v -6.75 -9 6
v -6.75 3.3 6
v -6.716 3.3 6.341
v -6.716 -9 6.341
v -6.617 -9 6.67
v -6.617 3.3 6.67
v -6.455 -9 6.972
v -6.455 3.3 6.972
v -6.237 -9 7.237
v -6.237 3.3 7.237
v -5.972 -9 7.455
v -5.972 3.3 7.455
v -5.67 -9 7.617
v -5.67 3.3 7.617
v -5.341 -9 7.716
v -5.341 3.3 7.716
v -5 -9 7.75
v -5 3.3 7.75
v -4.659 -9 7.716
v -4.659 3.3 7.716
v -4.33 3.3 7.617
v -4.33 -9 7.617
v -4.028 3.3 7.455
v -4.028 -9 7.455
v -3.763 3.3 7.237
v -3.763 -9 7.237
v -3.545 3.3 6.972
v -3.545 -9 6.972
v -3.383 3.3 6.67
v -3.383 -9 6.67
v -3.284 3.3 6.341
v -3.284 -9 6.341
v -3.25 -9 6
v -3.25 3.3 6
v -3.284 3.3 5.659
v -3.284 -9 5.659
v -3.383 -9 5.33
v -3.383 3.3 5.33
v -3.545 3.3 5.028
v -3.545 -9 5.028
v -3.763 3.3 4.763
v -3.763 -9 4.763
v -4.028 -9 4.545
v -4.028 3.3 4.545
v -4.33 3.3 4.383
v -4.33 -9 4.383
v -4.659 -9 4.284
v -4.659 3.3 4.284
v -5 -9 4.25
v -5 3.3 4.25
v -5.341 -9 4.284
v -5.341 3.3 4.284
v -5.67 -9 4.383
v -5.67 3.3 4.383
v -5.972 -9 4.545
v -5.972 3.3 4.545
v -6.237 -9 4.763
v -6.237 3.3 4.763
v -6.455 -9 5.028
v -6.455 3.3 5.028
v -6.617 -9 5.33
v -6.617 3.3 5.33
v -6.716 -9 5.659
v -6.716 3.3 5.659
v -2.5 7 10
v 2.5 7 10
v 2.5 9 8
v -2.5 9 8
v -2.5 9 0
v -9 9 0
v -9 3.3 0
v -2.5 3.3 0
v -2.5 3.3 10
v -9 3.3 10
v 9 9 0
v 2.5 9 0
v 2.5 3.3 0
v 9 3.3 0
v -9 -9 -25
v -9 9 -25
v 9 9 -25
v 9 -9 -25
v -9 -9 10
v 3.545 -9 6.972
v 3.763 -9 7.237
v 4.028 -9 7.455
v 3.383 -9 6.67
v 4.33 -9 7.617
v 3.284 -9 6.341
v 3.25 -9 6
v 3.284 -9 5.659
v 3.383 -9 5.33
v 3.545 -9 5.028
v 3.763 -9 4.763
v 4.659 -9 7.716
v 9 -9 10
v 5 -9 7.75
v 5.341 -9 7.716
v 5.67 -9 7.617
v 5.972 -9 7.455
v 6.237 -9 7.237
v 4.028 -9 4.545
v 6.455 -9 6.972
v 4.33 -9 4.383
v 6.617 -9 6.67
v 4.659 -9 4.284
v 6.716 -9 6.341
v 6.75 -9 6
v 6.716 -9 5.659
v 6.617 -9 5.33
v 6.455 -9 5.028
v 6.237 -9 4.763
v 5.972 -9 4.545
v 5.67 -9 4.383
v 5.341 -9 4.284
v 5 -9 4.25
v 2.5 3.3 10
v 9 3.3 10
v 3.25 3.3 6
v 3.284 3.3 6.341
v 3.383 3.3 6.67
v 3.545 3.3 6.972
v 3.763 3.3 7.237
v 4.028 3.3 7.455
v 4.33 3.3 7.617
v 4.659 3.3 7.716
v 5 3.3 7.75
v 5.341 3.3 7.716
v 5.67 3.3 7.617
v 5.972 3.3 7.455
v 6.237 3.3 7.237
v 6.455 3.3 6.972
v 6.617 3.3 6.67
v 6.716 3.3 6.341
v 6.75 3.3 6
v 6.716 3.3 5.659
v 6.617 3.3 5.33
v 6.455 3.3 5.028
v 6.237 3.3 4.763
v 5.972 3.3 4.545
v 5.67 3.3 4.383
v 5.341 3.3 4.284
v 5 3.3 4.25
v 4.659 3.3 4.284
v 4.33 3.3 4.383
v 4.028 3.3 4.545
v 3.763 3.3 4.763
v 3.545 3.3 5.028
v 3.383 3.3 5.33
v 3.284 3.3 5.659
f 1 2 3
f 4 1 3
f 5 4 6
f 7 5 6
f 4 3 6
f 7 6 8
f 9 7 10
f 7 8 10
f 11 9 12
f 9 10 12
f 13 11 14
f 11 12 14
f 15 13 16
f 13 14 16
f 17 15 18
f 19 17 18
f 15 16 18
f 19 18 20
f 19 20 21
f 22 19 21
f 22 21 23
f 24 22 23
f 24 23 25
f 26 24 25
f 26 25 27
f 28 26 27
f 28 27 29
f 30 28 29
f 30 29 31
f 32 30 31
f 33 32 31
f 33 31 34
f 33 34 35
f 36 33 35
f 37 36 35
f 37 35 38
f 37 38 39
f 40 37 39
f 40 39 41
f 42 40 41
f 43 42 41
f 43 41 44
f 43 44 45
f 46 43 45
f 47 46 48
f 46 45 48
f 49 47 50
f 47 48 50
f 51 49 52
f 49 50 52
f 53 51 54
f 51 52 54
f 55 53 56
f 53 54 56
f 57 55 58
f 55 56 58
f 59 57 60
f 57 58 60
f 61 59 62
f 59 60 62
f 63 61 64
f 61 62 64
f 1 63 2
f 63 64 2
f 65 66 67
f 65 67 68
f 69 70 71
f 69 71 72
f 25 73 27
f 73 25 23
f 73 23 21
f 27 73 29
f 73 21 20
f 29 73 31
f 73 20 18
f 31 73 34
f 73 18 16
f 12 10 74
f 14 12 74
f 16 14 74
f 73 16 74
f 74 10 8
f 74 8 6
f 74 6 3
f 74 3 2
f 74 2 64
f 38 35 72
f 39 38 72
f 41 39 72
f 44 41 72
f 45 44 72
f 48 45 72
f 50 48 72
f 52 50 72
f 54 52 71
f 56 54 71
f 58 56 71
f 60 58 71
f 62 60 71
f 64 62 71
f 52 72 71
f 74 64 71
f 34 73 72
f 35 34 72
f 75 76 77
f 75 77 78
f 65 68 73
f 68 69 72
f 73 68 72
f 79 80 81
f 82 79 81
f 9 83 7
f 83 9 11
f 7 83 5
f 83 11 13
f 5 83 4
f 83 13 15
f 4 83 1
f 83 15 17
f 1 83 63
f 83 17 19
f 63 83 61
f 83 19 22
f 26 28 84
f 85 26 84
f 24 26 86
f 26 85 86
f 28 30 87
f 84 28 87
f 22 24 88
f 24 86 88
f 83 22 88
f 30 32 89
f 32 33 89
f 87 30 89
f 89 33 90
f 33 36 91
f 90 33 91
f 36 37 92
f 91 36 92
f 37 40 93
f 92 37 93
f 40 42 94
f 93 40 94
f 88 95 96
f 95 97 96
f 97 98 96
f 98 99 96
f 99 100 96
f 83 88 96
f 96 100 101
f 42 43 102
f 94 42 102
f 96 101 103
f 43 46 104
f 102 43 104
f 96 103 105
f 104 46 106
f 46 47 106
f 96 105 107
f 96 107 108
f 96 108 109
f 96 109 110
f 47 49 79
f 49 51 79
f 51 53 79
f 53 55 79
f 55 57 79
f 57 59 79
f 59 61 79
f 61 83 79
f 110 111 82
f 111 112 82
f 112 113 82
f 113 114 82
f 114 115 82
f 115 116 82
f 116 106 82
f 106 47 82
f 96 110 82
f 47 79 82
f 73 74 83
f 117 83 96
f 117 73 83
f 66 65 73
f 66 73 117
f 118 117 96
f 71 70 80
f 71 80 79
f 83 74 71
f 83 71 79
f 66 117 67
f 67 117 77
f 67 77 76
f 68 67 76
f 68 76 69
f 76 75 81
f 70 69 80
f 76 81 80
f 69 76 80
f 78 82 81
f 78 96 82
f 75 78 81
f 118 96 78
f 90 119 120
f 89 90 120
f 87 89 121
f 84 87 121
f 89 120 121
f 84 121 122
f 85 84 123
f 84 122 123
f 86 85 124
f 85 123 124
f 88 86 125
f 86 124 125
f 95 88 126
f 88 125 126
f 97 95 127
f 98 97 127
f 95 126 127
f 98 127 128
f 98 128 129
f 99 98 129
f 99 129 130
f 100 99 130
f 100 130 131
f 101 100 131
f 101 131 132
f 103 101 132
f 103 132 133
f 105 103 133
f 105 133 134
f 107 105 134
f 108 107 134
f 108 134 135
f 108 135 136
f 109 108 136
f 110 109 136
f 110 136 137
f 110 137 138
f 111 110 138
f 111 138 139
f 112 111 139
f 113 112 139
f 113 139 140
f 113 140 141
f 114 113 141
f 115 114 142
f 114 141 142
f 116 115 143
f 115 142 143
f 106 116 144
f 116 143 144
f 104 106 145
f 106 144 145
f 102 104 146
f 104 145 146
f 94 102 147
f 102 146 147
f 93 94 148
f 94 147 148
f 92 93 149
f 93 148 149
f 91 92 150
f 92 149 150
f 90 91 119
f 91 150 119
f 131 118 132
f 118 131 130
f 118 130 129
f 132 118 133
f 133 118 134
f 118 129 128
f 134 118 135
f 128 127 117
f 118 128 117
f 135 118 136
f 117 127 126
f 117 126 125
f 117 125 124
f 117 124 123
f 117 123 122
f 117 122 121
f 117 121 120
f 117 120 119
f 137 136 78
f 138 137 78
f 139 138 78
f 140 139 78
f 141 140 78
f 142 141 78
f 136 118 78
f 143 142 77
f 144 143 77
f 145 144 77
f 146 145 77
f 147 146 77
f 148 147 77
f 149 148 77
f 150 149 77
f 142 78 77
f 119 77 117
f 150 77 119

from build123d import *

# Parameters (mm, degrees)
F0_W     = 6.5
F0_H     = 5.7
F1_DEPTH = 25
F2_DEPTH = 10
F3_SIZE  = 2
F5_D     = 3.5


with BuildPart() as f1:
    # F0 (on Top) → F1 (new body)
    with BuildSketch(Plane.XY):
        Polygon((2.5, 9), (-2.5, 9), (-2.5, 3.3), (-9, 3.3), (-9, -9), (9, -9), (9, 3.3), (2.5, 3.3), align=None)
        with Locations((-5.75, 6.15)):
            Rectangle(F0_W, F0_H)
        with Locations((5.75, 6.15)):
            Rectangle(F0_W, F0_H)
    extrude(amount=-F1_DEPTH)

    # F0 (on Top) → F2 (join)
    with BuildSketch(Plane.XY):
        Polygon((2.5, 9), (-2.5, 9), (-2.5, 3.3), (-9, 3.3), (-9, -9), (9, -9), (9, 3.3), (2.5, 3.3), align=None)
    extrude(amount=F2_DEPTH)

    # F3
    f3_edges = [f1.edges().sort_by_distance(p)[0] for p in [
        (0, 9, 10),
    ]]
    chamfer(f3_edges, length=F3_SIZE)

    # F5 (through all)
    with Locations(Plane.XZ.offset(9)):
        with Locations((-5, 6), (5, 6)):
            Hole(F5_D / 2)


solid = f1.part
